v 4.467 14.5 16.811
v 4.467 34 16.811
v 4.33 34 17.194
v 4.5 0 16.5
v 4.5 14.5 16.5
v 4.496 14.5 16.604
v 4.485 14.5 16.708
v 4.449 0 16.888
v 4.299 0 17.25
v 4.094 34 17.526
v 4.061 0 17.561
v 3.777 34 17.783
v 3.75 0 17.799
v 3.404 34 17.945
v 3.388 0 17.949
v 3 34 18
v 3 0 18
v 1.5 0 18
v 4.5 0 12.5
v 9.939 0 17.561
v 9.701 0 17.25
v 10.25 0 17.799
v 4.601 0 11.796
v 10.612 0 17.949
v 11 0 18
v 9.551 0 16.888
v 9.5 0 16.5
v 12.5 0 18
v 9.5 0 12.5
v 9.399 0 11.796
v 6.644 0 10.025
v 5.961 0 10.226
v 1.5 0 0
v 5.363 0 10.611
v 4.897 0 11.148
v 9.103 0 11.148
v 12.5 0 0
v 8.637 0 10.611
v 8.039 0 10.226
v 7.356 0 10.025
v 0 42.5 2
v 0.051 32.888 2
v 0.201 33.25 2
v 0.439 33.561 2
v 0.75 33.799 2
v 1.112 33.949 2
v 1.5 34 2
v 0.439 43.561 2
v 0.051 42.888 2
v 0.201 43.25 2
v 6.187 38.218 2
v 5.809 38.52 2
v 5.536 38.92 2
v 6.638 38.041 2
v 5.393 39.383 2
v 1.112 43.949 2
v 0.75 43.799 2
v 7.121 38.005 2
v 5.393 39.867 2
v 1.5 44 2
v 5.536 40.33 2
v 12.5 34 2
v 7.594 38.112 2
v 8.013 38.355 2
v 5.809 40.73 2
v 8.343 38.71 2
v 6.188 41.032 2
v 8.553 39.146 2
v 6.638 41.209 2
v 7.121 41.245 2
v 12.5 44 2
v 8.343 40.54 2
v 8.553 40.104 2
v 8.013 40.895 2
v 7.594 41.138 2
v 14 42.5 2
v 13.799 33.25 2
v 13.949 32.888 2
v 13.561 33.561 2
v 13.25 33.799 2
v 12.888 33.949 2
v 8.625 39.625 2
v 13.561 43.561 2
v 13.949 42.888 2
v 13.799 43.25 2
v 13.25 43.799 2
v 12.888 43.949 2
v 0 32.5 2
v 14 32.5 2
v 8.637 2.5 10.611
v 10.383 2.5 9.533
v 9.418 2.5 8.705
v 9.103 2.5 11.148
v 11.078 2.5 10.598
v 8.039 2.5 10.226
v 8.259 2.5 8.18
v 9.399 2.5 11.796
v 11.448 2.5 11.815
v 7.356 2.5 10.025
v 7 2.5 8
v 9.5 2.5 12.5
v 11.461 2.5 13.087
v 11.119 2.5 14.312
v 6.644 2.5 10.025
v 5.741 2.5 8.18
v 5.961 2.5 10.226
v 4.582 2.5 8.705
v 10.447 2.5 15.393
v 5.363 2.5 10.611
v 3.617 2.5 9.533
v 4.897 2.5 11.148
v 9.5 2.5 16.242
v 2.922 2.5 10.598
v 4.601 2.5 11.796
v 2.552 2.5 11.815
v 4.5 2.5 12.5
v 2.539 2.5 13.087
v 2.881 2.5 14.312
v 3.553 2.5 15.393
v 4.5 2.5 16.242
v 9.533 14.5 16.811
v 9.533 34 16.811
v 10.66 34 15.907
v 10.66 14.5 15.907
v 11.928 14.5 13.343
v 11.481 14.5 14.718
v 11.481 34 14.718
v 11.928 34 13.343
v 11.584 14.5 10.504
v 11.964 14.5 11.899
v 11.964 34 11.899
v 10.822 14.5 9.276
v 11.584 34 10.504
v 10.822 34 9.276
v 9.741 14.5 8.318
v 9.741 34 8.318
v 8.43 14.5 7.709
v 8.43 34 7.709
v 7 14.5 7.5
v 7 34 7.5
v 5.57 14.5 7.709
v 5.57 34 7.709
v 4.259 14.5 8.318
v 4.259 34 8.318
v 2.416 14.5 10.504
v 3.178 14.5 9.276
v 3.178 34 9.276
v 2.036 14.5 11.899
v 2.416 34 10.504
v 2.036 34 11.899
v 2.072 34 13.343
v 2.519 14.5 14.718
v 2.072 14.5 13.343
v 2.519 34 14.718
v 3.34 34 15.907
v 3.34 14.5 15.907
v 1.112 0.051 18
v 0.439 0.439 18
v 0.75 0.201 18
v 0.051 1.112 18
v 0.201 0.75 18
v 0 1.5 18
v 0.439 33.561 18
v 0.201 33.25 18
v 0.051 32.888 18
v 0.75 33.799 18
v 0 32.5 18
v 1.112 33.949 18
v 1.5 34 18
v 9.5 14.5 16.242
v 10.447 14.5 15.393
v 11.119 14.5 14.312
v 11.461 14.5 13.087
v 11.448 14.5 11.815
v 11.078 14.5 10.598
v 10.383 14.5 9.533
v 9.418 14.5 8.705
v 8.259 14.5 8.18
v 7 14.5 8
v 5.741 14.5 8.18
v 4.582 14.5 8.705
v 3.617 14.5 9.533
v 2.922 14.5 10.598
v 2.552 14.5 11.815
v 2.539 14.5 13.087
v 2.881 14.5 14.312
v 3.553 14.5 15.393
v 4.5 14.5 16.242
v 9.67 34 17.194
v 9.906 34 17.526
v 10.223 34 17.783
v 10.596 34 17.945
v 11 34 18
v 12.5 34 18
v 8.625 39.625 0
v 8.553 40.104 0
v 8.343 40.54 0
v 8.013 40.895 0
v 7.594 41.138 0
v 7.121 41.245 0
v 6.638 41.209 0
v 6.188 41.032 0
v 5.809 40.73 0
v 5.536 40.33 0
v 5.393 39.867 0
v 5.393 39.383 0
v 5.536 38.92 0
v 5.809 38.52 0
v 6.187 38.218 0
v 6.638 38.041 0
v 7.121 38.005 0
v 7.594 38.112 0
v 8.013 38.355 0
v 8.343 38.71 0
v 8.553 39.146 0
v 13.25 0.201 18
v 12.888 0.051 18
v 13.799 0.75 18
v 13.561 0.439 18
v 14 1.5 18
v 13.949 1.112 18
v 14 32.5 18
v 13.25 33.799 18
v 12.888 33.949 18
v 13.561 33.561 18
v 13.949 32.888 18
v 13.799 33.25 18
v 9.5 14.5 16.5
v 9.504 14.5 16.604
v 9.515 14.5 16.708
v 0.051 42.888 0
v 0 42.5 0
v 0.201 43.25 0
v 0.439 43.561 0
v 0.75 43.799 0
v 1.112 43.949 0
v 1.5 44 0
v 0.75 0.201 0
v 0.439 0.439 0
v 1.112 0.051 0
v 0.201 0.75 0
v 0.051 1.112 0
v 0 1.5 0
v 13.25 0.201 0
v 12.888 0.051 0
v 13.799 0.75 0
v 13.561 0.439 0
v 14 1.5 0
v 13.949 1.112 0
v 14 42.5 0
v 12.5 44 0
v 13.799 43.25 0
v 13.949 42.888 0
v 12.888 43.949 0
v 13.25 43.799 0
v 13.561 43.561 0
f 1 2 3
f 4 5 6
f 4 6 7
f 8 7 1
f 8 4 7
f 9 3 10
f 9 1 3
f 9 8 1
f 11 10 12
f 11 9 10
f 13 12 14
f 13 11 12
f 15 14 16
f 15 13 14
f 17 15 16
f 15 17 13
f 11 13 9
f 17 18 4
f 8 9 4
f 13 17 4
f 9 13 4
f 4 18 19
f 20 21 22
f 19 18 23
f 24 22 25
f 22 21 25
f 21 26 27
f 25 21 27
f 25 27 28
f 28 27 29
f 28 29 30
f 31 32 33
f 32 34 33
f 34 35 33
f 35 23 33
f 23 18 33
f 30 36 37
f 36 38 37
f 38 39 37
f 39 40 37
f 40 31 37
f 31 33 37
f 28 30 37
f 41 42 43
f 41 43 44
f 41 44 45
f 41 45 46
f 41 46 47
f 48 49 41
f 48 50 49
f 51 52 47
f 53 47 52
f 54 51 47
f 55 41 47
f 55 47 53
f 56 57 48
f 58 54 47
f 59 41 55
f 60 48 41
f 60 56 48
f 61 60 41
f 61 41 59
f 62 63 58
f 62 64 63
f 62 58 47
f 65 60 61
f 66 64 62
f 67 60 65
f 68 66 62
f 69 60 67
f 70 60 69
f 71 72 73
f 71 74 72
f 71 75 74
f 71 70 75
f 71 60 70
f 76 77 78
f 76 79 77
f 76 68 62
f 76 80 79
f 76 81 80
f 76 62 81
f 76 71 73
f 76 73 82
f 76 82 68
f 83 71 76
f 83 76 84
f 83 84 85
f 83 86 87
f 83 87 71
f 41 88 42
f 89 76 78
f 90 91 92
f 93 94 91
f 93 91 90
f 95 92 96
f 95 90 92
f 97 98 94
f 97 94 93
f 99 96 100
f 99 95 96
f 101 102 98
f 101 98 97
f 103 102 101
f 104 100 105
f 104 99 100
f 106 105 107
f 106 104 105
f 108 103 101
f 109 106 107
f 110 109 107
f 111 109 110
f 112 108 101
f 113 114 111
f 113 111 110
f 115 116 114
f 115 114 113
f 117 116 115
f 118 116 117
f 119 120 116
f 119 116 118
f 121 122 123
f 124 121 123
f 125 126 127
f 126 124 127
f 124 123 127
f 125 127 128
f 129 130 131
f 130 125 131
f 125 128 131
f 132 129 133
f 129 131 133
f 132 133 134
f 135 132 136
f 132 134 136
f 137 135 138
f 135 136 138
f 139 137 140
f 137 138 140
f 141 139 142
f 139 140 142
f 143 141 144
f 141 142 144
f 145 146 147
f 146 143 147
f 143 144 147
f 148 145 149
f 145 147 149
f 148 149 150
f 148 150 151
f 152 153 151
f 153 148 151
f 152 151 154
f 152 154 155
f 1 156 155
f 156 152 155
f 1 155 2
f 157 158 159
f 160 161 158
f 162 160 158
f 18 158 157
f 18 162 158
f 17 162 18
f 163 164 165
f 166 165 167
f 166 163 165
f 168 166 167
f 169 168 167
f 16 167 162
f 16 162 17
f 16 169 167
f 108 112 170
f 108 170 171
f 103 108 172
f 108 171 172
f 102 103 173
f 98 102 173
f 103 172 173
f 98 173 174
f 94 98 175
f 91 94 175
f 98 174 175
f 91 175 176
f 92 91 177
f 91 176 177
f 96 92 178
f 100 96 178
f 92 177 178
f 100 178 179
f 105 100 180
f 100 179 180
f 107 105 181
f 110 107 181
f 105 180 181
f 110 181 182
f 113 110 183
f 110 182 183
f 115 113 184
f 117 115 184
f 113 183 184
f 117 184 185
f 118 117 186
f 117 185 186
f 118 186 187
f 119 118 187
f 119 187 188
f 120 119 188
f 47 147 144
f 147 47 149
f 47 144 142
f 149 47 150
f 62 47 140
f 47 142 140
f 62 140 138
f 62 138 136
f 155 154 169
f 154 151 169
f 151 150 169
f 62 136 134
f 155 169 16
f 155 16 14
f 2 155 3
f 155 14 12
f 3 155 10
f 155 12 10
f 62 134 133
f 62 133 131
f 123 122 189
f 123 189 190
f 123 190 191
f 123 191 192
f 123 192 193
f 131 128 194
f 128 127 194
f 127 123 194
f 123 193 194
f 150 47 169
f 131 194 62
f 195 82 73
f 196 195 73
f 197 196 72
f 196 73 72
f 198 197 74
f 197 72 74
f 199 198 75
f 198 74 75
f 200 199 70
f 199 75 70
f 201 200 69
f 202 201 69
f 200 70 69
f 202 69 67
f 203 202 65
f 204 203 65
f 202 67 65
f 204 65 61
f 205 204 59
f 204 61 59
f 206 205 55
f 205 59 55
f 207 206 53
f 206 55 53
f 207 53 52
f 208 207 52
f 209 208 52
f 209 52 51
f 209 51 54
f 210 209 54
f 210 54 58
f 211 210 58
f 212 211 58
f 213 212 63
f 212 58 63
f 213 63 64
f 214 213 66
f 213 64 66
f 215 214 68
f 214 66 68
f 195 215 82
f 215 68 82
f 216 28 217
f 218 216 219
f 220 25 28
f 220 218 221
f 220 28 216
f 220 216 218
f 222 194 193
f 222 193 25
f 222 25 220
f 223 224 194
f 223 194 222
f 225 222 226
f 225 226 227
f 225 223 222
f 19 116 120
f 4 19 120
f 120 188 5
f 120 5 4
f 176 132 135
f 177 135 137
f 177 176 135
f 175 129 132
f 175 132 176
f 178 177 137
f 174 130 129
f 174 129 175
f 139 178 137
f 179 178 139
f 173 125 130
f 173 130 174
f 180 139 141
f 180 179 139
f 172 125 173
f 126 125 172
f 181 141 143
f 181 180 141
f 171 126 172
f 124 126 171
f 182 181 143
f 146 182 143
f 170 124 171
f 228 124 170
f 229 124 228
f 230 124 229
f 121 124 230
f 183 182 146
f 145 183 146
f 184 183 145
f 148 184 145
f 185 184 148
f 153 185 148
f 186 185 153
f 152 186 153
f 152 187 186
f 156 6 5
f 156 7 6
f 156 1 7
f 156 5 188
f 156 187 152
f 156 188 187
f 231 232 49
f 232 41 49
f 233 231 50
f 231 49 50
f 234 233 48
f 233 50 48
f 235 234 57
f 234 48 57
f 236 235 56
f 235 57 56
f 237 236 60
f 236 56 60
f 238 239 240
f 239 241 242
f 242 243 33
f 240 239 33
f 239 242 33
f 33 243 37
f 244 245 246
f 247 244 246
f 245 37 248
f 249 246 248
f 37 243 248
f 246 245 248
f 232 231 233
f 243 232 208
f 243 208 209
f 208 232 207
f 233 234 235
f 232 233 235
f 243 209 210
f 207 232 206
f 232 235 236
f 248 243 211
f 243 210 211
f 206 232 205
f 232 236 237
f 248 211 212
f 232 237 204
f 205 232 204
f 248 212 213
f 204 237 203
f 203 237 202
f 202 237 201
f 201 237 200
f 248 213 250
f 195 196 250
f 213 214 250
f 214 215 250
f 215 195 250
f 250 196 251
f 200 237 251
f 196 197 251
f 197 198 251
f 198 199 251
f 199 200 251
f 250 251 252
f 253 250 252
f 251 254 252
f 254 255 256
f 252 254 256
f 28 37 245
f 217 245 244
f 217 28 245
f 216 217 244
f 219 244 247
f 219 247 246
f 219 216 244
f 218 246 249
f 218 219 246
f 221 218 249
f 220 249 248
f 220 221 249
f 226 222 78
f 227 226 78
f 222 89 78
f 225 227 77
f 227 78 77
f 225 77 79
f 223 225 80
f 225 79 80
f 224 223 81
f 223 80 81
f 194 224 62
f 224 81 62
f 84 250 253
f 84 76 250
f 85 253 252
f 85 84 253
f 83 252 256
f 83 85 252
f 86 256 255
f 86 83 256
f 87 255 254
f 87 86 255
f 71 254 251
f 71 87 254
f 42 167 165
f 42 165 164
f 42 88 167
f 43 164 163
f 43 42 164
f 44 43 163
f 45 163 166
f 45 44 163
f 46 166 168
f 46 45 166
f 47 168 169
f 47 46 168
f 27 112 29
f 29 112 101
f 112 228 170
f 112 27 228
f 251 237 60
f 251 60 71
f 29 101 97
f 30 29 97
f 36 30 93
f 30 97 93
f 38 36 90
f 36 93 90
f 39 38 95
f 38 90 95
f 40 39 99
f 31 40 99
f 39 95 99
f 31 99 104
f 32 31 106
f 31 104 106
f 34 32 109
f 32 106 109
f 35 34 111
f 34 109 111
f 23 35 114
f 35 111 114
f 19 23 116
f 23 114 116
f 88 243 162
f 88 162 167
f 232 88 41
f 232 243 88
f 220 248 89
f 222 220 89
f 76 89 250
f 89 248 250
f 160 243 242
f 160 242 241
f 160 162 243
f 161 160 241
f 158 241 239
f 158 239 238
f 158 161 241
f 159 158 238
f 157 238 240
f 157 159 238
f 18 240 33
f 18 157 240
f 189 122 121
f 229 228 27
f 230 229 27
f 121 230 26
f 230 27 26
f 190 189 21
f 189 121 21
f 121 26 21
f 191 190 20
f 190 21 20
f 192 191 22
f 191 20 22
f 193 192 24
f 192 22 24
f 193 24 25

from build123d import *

# Parameters (mm, degrees)
F0_W      = 14
F0_H      = 44
F1_DEPTH  = 18
F2_W      = 14
F2_H      = 10
F3_DEPTH  = 16
F4_R      = 1.625
F5_DEPTH  = 2
F6_R      = 2.5
F7_DEPTH  = 34
F6_R_2    = 4.5
F8_DEPTH  = 31.5
F6_R_3    = 5
F9_DEPTH  = 19.5
F11_DEPTH = 34
F12_R     = 1.5


with BuildPart() as f1:
    # F0 (on Top) → F1 (new body)
    with BuildSketch(Plane.XY):
        with Locations((7, 22)):
            Rectangle(F0_W, F0_H)
    extrude(amount=F1_DEPTH)

    # F2 (on face) → F3 (cut)
    with BuildSketch(Plane.XY.offset(18)):
        with Locations((7, 39)):
            Rectangle(F2_W, F2_H)
    extrude(amount=-F3_DEPTH, mode=Mode.SUBTRACT)

    # F4 (on face) → F5 (cut, through all)
    with BuildSketch(Plane.XY.offset(2)):
        with Locations((7, 39.625)):
            Circle(F4_R)
    extrude(amount=-F5_DEPTH, mode=Mode.SUBTRACT)

    # F6 (on face) → F7 (cut, through all)
    with BuildSketch(Plane(origin=(0, 34, 0), x_dir=(-1, 0, 0), z_dir=(0, 1, 0))):
        with Locations((-7, 12.5)):
            Circle(F6_R)
    extrude(amount=-F7_DEPTH, mode=Mode.SUBTRACT)

    # F6 (on face) → F8 (cut)
    with BuildSketch(Plane(origin=(0, 34, 0), x_dir=(-1, 0, 0), z_dir=(0, 1, 0))):
        with Locations((-7, 12.5)):
            Circle(F6_R_2)
        with Locations((-7, 12.5)):
            Circle(F6_R, mode=Mode.SUBTRACT)
    extrude(amount=-F8_DEPTH, mode=Mode.SUBTRACT)

    # F6 (on face) → F9 (cut)
    with BuildSketch(Plane(origin=(0, 34, 0), x_dir=(-1, 0, 0), z_dir=(0, 1, 0))):
        with Locations((-7, 12.5)):
            Circle(F6_R_3)
        with Locations((-7, 12.5)):
            Circle(F6_R_2, mode=Mode.SUBTRACT)
    extrude(amount=-F9_DEPTH, mode=Mode.SUBTRACT)

    # F10 (on face) → F11 (cut, through all)
    with BuildSketch(Plane(origin=(0, 34, 0), x_dir=(-1, 0, 0), z_dir=(0, 1, 0))):
        with BuildLine():
            ThreePointArc((-4.5, 16.8301270189), (-7, 17.5), (-9.5, 16.8301270189))
            Line((-9.5, 16.8301270189), (-9.5, 12.5))
            ThreePointArc((-9.5, 12.5), (-7, 15), (-4.5, 12.5))
            Line((-4.5, 12.5), (-4.5, 16.8301270189))
        make_face()
        with BuildLine():
            Line((-4.5, 18), (-9.5, 18))
            Line((-9.5, 18), (-9.5, 16.8301270189))
            ThreePointArc((-9.5, 16.8301270189), (-7, 17.5), (-4.5, 16.8301270189))
            Line((-4.5, 16.8301270189), (-4.5, 18))
        make_face()
    extrude(amount=-F11_DEPTH, mode=Mode.SUBTRACT)

    # F12
    f12_edges = [f1.edges().sort_by_distance(p)[0] for p in [
        (0, 44, 1),
        (14, 44, 1),
        (4.5, 17, 18),
        (9.5, 17, 18),
        (14, 0, 9),
        (0, 0, 9),
        (0, 34, 10),
        (14, 34, 10),
    ]]
    fillet(f12_edges, radius=F12_R)


solid = f1.part
